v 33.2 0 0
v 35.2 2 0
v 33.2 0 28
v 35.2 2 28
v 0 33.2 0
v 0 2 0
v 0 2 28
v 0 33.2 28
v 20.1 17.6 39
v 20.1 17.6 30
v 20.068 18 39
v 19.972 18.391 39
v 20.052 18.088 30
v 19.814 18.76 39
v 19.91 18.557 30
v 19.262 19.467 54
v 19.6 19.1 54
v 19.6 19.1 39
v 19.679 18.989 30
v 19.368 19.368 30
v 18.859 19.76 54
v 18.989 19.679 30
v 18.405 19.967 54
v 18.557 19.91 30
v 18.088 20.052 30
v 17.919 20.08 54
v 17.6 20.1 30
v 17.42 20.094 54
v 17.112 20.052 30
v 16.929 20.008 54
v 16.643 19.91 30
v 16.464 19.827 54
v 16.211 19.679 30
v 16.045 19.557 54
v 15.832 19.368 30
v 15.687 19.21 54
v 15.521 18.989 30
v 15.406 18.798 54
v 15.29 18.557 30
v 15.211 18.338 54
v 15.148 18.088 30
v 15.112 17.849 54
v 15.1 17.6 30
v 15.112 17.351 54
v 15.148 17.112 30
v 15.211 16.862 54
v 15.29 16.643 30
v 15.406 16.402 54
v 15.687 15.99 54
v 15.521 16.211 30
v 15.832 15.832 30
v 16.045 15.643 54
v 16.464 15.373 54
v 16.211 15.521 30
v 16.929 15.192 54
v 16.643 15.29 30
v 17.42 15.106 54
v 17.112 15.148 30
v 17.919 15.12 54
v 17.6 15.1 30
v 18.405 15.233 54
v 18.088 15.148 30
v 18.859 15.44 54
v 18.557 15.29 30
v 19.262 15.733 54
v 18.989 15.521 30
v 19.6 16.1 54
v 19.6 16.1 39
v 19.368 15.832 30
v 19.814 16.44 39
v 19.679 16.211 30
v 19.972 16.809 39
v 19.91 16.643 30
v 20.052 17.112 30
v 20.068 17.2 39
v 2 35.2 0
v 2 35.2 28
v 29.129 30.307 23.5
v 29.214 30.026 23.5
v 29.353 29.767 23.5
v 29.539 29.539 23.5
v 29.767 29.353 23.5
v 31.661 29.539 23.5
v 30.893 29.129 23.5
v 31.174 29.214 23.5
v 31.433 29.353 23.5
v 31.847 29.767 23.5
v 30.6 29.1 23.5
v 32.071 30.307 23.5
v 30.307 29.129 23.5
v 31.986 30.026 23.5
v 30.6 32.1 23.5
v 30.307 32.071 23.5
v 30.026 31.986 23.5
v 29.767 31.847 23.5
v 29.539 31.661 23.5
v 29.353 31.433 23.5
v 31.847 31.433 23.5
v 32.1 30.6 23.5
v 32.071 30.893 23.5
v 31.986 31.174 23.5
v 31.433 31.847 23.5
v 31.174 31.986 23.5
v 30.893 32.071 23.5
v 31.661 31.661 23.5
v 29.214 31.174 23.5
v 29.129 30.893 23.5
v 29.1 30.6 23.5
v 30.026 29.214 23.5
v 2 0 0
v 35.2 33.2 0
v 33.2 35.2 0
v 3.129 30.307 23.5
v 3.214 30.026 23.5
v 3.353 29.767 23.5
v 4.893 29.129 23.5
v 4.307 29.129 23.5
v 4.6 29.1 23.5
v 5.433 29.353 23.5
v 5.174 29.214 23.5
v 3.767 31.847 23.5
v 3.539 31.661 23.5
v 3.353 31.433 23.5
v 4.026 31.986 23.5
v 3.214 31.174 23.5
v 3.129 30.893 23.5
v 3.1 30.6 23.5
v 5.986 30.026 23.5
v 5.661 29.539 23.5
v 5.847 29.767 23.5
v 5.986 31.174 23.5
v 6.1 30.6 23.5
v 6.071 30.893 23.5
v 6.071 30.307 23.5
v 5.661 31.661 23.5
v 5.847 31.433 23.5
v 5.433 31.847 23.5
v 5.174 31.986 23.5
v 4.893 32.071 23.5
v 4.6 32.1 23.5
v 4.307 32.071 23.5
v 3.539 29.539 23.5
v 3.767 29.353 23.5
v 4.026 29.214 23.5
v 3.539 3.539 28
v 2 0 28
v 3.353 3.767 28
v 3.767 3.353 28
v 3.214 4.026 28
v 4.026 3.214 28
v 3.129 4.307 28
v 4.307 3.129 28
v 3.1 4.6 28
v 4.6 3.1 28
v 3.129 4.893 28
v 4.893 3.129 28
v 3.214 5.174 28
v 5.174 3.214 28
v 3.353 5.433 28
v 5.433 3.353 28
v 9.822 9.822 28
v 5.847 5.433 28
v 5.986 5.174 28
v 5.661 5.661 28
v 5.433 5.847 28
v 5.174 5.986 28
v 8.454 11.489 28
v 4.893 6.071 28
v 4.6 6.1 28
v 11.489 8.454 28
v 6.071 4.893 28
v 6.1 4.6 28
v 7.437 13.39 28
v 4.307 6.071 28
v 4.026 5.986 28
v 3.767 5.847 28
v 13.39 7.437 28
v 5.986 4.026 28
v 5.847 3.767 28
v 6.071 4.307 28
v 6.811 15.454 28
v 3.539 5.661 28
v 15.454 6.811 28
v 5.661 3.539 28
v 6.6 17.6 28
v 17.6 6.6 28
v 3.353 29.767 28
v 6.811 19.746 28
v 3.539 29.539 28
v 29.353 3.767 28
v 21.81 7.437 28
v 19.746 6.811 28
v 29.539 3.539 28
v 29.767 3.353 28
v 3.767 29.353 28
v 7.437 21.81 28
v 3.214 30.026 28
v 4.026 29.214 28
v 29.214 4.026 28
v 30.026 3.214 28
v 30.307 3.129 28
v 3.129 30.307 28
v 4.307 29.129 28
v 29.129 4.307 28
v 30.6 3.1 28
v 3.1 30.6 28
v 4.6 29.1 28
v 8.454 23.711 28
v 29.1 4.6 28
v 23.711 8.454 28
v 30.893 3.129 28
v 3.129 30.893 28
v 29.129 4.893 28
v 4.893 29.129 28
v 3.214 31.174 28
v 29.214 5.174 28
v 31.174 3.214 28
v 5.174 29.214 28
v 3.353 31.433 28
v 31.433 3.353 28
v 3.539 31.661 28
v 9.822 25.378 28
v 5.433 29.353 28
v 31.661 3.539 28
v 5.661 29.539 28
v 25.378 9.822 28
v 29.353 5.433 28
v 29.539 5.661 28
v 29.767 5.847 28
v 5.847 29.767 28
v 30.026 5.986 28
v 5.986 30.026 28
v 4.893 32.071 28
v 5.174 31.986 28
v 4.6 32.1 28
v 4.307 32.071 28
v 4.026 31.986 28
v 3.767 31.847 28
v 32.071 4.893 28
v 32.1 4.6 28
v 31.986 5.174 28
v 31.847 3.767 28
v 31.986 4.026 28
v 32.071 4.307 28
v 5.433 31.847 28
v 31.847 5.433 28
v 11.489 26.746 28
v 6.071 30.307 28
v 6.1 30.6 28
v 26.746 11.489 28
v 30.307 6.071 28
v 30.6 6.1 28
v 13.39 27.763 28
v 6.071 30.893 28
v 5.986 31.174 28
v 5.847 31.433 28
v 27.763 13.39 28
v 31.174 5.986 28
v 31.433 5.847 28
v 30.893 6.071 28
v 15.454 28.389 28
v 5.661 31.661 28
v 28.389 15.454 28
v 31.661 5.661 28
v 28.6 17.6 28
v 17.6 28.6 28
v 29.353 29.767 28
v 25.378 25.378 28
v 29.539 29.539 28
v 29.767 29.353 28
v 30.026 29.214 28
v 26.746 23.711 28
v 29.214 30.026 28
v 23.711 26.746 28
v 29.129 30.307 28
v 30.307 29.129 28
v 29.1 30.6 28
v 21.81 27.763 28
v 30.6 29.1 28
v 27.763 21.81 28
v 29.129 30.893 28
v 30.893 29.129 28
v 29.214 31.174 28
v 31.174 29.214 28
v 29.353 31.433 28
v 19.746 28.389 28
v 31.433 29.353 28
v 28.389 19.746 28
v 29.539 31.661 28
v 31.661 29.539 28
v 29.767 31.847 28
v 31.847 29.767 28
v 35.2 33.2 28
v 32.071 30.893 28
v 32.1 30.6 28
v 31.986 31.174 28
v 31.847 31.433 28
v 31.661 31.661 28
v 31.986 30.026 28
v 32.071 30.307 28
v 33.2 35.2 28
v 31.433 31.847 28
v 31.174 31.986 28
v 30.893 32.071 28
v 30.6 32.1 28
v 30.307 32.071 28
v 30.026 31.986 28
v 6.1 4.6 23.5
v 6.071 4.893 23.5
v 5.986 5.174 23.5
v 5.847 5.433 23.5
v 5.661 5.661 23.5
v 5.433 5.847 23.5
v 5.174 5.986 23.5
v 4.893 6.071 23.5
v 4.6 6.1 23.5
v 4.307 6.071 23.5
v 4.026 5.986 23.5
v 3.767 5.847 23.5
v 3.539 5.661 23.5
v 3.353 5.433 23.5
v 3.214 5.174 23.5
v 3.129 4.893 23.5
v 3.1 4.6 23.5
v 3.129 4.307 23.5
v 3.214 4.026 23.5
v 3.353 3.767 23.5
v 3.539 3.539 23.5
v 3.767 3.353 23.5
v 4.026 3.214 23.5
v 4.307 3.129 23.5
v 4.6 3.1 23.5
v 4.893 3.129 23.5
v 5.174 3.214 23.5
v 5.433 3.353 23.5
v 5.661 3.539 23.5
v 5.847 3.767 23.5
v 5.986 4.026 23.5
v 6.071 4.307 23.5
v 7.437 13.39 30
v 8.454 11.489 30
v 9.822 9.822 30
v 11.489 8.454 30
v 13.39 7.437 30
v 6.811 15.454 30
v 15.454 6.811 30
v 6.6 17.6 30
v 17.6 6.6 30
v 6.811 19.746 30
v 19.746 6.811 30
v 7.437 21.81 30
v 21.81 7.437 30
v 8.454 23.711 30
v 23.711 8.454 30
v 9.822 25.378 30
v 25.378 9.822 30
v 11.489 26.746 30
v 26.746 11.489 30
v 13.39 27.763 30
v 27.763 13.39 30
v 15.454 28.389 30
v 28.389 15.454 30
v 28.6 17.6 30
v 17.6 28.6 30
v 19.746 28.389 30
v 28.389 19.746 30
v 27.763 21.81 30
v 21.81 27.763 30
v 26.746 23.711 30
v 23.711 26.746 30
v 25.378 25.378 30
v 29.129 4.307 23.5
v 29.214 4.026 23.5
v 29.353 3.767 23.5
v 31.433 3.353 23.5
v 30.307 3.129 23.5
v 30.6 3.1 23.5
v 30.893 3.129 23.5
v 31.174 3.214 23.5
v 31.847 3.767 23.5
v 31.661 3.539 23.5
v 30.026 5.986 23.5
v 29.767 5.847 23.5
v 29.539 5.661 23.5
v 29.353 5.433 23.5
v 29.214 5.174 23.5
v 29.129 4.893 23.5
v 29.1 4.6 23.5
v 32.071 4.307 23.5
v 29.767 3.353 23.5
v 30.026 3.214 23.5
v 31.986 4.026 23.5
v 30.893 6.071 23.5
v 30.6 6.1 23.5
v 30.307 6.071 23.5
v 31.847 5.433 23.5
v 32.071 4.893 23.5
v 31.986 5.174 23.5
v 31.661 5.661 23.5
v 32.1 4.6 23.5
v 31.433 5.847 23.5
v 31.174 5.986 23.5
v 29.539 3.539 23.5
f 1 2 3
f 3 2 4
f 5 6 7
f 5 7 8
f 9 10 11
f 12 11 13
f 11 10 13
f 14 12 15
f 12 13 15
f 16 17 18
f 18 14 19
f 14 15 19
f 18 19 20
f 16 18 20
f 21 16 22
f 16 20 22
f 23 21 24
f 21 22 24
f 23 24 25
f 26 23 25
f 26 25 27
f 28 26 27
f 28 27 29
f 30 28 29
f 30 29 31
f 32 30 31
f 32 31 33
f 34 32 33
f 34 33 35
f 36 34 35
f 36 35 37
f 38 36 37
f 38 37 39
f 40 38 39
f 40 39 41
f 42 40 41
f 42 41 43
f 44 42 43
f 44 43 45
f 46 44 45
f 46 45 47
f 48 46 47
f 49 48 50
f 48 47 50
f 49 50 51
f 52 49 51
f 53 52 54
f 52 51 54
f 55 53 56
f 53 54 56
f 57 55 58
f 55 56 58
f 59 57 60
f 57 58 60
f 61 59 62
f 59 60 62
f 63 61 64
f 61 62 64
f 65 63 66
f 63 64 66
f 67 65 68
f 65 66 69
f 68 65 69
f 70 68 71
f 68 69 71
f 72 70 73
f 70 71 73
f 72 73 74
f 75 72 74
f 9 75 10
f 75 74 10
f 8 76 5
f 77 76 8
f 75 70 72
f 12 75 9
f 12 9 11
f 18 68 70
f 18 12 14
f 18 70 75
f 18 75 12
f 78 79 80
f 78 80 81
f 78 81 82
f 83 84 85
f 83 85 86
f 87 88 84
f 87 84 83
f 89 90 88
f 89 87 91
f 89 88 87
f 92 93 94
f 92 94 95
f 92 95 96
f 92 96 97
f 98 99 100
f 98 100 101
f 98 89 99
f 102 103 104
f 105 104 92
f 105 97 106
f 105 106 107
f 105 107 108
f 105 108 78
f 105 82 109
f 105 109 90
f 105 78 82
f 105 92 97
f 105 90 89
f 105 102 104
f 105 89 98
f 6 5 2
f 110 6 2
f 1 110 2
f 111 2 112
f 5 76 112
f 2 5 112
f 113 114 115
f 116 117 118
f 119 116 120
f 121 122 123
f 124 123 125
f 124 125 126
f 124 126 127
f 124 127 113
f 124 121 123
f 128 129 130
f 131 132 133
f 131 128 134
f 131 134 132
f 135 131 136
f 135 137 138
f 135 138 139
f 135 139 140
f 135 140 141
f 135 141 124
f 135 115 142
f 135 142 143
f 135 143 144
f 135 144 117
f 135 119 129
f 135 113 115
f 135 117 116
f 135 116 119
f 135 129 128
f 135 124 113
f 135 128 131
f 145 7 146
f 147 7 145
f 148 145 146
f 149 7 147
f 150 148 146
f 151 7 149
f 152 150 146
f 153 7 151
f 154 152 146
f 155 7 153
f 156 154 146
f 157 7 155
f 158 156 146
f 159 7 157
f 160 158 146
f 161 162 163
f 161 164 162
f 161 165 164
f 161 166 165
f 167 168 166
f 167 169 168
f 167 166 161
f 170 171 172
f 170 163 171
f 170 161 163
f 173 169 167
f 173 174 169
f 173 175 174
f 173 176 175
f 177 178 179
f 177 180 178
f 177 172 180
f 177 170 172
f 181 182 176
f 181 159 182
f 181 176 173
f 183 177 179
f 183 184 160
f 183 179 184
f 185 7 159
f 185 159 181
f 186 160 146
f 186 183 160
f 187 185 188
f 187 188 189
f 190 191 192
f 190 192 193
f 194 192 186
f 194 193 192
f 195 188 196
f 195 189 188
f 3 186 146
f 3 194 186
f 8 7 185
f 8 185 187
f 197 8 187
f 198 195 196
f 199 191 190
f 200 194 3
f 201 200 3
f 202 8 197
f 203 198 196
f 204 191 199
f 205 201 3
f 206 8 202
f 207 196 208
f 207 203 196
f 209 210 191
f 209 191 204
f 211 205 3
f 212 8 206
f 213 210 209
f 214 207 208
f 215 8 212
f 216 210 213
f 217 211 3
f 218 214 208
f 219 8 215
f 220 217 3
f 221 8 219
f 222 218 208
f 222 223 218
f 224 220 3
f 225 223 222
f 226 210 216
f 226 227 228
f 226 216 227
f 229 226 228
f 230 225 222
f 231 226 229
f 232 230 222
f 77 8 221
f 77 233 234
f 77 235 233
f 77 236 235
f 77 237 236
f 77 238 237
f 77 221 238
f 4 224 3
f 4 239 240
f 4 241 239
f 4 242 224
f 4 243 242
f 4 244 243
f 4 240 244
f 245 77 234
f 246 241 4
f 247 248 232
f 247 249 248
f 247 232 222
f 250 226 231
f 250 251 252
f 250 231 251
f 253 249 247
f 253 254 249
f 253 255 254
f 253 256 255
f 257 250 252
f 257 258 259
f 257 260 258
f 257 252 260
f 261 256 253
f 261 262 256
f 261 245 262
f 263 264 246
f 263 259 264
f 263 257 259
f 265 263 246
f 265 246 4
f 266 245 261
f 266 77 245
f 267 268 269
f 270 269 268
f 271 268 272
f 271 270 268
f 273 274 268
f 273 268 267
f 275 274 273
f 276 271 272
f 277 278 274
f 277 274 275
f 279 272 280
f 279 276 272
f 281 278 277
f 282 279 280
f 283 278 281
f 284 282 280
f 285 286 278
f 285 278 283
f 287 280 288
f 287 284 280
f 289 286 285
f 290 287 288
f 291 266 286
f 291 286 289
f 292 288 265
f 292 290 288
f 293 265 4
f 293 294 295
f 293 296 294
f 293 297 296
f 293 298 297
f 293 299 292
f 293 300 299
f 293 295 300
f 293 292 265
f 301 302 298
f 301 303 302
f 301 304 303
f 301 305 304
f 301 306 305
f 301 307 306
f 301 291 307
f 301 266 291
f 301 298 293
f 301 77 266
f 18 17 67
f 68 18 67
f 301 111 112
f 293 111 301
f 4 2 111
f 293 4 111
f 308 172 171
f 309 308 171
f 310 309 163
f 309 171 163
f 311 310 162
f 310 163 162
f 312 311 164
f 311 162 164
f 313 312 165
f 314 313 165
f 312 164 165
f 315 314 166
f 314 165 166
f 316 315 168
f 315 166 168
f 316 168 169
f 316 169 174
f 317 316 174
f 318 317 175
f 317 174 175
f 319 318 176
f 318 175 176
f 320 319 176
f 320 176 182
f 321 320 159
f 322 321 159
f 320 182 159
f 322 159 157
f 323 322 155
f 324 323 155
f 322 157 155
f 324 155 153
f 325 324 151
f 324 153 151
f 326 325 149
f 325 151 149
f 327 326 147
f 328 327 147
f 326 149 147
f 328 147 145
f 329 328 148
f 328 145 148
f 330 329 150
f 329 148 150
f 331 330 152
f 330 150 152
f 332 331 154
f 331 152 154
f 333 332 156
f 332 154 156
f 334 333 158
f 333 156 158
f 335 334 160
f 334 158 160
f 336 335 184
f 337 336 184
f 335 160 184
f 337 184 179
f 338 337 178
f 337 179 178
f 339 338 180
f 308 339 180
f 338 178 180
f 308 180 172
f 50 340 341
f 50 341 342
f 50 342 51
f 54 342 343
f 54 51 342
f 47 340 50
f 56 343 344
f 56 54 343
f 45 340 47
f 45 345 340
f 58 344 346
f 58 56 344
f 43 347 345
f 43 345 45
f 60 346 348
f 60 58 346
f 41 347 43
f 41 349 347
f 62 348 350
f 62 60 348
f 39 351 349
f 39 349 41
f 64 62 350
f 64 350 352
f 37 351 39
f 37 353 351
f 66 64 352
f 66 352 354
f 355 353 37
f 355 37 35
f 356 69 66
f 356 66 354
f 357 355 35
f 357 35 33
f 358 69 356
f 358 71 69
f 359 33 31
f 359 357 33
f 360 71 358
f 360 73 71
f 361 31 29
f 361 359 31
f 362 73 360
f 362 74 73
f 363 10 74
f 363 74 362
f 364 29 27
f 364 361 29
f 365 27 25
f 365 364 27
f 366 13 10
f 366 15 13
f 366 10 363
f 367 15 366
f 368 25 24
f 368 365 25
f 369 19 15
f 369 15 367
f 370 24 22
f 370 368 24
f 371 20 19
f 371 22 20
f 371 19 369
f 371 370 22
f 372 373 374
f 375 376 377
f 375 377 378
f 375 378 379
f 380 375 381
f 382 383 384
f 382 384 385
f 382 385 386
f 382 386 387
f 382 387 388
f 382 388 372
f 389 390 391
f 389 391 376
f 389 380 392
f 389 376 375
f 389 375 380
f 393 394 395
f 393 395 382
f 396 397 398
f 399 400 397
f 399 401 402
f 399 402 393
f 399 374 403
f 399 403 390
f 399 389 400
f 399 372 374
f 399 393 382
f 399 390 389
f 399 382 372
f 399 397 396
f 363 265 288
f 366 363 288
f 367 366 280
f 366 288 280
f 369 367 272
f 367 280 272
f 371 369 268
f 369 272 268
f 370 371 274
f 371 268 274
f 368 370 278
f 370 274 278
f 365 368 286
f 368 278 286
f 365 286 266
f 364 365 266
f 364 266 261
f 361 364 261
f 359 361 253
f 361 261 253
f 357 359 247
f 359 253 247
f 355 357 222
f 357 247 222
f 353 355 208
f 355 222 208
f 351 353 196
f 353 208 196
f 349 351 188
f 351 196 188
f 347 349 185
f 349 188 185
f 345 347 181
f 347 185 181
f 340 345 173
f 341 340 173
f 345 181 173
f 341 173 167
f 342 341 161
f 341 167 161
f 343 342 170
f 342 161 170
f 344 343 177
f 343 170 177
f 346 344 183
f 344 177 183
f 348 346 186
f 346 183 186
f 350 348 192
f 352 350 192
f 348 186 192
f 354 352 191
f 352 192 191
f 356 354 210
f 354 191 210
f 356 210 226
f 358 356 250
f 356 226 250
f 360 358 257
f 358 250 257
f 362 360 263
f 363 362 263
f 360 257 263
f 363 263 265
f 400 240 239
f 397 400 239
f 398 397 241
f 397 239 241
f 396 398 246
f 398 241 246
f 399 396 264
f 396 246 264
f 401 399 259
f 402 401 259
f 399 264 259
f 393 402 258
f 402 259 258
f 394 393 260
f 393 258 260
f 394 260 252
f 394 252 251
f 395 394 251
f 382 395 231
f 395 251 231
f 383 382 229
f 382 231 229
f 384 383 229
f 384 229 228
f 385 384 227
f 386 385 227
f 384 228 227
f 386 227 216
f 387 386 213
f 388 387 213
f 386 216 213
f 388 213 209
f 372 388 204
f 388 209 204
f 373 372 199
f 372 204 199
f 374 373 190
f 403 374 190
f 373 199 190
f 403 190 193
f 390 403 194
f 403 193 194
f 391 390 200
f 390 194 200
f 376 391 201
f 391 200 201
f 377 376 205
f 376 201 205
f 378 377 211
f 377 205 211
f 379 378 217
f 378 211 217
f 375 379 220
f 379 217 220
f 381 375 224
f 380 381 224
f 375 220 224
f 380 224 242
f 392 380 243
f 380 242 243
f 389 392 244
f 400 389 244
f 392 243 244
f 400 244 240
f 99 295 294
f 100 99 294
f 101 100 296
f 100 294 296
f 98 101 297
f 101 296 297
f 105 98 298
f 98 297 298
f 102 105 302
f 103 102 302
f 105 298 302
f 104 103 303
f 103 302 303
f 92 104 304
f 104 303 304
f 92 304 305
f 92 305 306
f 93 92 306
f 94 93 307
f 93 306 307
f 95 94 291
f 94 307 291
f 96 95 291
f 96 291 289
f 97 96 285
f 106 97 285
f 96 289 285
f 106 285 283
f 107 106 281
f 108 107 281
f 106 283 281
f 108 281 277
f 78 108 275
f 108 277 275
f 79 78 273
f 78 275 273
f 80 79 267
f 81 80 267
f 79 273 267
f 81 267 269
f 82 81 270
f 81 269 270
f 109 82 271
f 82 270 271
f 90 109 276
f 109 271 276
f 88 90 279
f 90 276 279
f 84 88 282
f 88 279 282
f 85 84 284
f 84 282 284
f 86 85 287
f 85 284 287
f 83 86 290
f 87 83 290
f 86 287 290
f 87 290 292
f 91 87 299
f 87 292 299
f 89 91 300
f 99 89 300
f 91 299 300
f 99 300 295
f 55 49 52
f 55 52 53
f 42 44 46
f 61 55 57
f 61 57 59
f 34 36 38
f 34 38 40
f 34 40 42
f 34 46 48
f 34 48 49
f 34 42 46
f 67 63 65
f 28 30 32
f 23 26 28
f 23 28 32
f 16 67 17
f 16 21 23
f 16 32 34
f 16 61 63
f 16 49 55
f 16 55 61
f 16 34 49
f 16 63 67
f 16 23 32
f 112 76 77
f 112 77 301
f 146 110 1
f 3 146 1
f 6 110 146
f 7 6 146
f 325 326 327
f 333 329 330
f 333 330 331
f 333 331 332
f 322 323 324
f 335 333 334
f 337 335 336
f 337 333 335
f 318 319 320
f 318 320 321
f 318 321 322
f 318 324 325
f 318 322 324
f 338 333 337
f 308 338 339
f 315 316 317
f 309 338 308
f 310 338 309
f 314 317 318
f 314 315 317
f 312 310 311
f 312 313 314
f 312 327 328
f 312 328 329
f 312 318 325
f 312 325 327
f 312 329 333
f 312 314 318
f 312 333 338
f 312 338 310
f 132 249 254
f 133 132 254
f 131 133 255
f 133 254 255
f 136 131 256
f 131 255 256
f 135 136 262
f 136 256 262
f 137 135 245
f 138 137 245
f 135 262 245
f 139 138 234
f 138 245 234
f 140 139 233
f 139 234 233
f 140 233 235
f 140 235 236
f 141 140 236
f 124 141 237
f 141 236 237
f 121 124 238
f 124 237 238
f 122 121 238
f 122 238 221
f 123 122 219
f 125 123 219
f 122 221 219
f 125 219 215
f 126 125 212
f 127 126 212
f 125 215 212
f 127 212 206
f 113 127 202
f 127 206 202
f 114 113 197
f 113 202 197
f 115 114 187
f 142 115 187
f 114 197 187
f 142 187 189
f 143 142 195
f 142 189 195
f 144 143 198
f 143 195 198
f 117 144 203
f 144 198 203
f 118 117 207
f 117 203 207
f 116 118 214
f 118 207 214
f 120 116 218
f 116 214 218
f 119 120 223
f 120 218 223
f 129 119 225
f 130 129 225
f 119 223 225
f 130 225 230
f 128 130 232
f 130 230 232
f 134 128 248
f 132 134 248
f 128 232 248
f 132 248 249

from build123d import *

# Parameters (mm, degrees)
ESQUISSE2_W             = 35.2
ESQUISSE2_H             = 35.2
BOSS_EXTRU_1_DEPTH      = 28
ESQUISSE3_R             = 11
BOSS_EXTRU_2_DEPTH      = 2
ESQUISSE4_R             = 2.5
BOSS_EXTRU_3_DEPTH      = 24
ENL_V_START             = -15
ENL_V_MAT_EXTRU_1_DEPTH = 15
CHANFREIN1_SIZE         = 2
ESQUISSE6_R             = 1.5
ENL_V_MAT_EXTRU_2_DEPTH = 4.5


with BuildPart() as part:
    # Esquisse2 → Boss.-Extru.1 (new body)
    with BuildSketch(Plane.XY):
        with Locations((17.6, 17.6)):
            Rectangle(ESQUISSE2_W, ESQUISSE2_H)
    extrude(amount=BOSS_EXTRU_1_DEPTH)

    # Esquisse3 → Boss.-Extru.2 (add)
    with BuildSketch(Plane.XY.offset(28)):
        with Locations((17.6, 17.6)):
            Circle(ESQUISSE3_R)
    extrude(amount=BOSS_EXTRU_2_DEPTH)

    # Esquisse4 → Boss.-Extru.3 (add)
    with BuildSketch(Plane.XY.offset(30)):
        with Locations((17.6, 17.6)):
            Circle(ESQUISSE4_R)
    extrude(amount=BOSS_EXTRU_3_DEPTH)

    # Esquisse5 → Enlèv. mat.-Extru.1 (cut)
    with BuildSketch(Plane.XY.offset(54).offset(ENL_V_START)):
        with BuildLine():
            Line((19.6, 19.1), (19.6, 16.1))
            ThreePointArc((19.6, 16.1), (20.1, 17.6), (19.6, 19.1))
        make_face()
    extrude(amount=ENL_V_MAT_EXTRU_1_DEPTH, mode=Mode.SUBTRACT)

    # Chanfrein1
    chanfrein1_edges = [part.edges().sort_by_distance(p)[0] for p in [
        (0, 0, 14),
        (35.2, 0, 14),
        (0, 35.2, 14),
        (35.2, 35.2, 14),
    ]]
    chamfer(chanfrein1_edges, length=CHANFREIN1_SIZE)

    # Esquisse6 → Enlèv. mat.-Extru.2 (cut)
    with BuildSketch(Plane.XY.offset(28)):
        with Locations((30.6, 30.6)):
            Circle(ESQUISSE6_R)
        with Locations((30.6, 4.6)):
            Circle(ESQUISSE6_R)
        with Locations((4.6, 4.6)):
            Circle(ESQUISSE6_R)
        with Locations((4.6, 30.6)):
            Circle(ESQUISSE6_R)
    extrude(amount=-ENL_V_MAT_EXTRU_2_DEPTH, mode=Mode.SUBTRACT)


solid = part.part
